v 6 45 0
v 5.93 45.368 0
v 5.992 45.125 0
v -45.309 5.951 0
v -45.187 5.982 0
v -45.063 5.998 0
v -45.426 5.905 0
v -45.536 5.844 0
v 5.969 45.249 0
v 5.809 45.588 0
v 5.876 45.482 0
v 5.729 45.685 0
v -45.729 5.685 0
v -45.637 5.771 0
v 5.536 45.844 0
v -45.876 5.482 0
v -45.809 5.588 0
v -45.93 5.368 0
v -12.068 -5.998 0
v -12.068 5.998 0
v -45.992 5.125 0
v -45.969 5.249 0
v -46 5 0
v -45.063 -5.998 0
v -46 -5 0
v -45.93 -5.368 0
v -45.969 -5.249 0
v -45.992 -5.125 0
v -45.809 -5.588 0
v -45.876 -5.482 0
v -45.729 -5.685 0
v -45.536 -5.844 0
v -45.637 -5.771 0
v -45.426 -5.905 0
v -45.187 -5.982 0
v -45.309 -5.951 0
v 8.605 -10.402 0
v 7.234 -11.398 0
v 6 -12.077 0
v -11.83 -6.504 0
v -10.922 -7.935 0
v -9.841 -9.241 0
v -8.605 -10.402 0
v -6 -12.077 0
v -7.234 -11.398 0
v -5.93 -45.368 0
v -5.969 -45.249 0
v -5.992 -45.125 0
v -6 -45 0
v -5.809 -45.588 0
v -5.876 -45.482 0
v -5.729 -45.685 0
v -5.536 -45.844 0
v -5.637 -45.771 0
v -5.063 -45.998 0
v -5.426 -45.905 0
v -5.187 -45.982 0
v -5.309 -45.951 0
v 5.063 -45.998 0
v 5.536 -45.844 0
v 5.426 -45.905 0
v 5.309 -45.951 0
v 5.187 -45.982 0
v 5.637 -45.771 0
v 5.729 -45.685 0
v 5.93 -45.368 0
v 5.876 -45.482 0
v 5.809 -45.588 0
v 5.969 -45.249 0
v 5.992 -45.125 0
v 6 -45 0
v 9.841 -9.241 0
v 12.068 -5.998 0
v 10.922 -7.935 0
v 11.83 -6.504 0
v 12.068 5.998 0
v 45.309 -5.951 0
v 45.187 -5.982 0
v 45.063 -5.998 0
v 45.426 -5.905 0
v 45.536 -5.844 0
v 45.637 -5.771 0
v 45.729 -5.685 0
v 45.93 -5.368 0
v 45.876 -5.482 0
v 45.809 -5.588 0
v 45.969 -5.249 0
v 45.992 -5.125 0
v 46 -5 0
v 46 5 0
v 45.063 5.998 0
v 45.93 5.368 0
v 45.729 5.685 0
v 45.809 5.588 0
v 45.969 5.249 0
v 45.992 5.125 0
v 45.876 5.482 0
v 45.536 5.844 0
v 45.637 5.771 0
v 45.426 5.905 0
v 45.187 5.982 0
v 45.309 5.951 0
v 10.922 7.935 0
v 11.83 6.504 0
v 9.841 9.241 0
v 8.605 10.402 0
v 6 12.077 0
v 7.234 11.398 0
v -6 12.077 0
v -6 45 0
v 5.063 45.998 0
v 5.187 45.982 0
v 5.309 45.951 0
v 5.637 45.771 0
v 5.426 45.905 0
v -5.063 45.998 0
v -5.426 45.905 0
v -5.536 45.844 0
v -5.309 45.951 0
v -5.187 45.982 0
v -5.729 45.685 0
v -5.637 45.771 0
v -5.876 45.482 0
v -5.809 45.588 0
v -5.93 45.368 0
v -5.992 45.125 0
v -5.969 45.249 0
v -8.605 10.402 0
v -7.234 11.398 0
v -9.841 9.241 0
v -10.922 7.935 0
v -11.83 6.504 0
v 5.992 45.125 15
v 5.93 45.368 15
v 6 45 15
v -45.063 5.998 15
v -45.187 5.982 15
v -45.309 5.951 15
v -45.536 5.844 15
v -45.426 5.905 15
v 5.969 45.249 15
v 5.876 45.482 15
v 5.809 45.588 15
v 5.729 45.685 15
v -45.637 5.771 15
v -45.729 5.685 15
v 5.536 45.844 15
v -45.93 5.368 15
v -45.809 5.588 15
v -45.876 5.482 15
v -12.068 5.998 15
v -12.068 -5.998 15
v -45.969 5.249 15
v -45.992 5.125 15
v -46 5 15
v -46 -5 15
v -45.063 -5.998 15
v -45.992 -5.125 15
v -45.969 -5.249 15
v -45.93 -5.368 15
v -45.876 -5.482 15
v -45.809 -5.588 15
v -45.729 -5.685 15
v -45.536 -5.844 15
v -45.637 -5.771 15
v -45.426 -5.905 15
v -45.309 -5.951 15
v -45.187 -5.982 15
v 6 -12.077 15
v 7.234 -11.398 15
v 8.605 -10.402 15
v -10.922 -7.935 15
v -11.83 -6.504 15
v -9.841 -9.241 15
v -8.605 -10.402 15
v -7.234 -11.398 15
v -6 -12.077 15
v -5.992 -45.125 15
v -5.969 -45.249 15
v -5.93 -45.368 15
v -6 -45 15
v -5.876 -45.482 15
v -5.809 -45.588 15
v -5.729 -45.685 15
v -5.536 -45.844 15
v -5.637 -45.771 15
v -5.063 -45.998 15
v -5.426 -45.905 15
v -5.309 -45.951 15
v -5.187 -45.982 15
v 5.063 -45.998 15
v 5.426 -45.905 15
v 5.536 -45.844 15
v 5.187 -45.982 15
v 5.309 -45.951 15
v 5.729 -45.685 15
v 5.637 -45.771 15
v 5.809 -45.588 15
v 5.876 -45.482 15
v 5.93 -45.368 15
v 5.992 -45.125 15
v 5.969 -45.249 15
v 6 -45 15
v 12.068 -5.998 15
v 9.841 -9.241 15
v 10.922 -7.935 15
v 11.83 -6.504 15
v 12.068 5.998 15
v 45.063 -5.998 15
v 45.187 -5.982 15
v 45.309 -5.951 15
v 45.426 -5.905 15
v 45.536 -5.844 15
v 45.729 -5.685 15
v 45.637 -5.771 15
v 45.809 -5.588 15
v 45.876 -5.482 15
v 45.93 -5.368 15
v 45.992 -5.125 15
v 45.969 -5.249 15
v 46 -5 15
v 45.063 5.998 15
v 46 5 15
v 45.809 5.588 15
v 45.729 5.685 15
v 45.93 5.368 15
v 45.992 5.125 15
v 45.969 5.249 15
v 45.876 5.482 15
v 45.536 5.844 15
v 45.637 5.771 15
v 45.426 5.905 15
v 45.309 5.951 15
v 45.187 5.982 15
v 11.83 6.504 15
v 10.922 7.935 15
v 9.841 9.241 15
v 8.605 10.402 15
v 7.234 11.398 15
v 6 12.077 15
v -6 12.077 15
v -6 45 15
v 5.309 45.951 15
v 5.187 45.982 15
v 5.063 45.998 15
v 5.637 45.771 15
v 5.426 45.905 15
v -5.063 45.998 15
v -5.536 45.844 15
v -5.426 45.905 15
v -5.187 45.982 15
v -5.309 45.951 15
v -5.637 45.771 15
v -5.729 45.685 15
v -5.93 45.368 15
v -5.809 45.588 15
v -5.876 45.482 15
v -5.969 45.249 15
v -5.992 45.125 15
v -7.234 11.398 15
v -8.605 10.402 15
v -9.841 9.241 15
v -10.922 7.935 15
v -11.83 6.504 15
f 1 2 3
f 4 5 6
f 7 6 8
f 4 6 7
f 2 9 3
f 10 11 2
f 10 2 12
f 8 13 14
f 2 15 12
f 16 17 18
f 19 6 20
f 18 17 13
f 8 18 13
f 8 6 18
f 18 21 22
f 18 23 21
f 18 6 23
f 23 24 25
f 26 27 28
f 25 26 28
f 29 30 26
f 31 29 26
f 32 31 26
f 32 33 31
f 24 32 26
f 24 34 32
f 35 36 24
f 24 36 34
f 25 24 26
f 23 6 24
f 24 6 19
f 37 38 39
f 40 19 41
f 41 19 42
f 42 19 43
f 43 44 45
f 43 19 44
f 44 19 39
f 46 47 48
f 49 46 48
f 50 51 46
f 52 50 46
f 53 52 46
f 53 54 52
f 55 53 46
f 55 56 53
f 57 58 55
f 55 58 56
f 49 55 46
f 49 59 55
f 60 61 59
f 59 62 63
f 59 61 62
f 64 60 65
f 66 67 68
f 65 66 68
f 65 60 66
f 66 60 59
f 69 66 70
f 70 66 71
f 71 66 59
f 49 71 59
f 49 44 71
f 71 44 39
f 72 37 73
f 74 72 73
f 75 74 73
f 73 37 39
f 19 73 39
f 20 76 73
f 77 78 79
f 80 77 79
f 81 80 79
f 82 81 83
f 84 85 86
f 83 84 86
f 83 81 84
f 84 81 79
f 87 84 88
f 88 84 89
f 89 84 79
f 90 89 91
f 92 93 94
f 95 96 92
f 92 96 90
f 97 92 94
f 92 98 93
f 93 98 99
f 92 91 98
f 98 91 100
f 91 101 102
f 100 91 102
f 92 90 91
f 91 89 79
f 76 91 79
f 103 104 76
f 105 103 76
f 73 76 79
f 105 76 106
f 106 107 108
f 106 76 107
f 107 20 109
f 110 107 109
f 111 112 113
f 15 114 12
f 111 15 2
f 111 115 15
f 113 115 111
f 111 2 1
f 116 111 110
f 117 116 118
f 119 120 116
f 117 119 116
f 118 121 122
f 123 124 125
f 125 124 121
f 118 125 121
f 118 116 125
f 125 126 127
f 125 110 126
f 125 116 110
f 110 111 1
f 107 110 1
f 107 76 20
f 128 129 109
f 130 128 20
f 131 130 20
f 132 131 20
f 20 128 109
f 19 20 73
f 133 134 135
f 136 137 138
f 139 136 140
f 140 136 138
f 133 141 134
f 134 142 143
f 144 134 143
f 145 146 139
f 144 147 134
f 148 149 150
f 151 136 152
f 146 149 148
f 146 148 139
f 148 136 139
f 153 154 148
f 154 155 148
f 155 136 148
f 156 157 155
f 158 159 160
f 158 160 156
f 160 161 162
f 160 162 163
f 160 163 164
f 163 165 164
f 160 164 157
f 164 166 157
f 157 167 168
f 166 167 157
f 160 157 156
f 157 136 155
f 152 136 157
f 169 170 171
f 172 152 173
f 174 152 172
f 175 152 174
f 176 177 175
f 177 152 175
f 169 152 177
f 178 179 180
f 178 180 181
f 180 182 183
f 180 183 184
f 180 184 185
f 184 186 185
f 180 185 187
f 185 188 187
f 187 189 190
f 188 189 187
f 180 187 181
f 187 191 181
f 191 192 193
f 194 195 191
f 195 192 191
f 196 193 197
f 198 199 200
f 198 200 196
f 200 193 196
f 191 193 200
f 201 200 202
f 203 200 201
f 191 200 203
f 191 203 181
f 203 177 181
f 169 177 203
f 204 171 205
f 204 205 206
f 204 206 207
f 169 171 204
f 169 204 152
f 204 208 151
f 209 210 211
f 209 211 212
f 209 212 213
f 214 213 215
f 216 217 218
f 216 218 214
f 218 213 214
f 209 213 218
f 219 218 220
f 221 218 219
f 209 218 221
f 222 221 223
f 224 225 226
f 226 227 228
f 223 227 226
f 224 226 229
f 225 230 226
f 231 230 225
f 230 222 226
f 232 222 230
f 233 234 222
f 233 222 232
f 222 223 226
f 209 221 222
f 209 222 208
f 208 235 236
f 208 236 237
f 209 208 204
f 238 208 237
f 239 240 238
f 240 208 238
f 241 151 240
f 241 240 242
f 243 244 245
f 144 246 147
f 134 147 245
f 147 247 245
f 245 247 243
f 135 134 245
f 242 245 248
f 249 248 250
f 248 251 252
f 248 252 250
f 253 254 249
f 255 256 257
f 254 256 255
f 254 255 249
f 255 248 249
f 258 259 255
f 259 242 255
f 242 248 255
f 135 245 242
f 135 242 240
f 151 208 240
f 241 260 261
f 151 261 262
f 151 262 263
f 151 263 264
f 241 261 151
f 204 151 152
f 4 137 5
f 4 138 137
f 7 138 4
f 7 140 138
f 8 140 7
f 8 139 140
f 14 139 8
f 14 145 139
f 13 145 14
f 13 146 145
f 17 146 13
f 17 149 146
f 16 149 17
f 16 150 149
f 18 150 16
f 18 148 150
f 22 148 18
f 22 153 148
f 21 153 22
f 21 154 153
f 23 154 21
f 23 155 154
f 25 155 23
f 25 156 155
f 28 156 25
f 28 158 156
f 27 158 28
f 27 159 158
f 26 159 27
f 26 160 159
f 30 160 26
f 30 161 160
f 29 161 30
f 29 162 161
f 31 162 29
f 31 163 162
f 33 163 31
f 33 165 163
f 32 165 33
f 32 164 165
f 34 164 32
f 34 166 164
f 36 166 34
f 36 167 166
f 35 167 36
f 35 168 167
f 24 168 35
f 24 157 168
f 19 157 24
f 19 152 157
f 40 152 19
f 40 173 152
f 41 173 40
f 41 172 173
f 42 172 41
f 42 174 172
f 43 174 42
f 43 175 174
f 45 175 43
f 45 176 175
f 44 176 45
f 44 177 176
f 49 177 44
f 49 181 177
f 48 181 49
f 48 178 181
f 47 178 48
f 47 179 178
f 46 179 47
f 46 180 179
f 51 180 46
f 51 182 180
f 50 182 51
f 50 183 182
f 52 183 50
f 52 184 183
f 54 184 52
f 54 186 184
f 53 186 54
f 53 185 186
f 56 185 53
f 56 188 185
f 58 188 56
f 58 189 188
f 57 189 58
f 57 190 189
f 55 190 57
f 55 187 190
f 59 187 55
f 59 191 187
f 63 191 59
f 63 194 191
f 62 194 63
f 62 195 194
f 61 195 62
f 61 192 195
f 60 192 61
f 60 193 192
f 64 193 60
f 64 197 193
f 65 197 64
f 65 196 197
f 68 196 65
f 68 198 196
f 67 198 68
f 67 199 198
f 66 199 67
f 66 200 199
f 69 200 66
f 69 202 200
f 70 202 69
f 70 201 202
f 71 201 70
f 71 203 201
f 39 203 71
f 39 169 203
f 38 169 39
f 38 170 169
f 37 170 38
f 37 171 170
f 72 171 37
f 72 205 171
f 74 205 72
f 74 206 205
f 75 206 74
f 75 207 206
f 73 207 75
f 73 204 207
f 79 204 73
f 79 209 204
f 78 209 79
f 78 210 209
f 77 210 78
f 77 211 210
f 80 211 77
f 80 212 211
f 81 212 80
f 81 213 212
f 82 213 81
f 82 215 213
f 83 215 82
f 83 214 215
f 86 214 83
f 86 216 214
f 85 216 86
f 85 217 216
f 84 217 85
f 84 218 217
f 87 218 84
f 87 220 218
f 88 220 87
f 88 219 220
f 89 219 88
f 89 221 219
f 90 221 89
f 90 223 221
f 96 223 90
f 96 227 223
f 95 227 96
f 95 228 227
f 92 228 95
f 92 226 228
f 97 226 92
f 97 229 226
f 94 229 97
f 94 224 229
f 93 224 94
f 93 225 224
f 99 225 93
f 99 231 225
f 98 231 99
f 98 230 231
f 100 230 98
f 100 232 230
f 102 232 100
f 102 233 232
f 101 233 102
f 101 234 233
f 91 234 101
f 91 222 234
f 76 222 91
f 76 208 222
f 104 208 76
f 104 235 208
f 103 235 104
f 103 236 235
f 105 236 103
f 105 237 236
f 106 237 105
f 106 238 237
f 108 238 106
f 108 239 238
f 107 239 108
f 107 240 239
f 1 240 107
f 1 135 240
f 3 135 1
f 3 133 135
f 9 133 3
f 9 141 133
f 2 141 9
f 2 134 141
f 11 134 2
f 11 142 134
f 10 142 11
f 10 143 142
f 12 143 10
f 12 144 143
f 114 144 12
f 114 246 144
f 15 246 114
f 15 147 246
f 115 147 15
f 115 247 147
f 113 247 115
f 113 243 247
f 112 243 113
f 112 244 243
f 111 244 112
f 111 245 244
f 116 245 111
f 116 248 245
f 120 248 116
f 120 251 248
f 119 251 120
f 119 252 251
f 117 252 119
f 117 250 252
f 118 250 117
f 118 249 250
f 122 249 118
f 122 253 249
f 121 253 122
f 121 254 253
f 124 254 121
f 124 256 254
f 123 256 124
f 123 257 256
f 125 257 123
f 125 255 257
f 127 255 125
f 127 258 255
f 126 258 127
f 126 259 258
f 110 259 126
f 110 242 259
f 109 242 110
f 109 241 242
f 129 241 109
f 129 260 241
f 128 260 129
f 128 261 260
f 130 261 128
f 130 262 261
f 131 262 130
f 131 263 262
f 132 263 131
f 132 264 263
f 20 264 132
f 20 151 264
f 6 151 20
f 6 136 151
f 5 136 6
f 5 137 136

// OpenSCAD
/*
 * A basic test print of an X with a circle in the center
 */
$fn=50;

linear_extrude(height=15)
minkowski() {
    union() {
        square([10, 90], center=true);
        rotate([0,0,90])
            square([10, 90], center=true);
        circle(d=25);
    }

    circle(r=1);
}
